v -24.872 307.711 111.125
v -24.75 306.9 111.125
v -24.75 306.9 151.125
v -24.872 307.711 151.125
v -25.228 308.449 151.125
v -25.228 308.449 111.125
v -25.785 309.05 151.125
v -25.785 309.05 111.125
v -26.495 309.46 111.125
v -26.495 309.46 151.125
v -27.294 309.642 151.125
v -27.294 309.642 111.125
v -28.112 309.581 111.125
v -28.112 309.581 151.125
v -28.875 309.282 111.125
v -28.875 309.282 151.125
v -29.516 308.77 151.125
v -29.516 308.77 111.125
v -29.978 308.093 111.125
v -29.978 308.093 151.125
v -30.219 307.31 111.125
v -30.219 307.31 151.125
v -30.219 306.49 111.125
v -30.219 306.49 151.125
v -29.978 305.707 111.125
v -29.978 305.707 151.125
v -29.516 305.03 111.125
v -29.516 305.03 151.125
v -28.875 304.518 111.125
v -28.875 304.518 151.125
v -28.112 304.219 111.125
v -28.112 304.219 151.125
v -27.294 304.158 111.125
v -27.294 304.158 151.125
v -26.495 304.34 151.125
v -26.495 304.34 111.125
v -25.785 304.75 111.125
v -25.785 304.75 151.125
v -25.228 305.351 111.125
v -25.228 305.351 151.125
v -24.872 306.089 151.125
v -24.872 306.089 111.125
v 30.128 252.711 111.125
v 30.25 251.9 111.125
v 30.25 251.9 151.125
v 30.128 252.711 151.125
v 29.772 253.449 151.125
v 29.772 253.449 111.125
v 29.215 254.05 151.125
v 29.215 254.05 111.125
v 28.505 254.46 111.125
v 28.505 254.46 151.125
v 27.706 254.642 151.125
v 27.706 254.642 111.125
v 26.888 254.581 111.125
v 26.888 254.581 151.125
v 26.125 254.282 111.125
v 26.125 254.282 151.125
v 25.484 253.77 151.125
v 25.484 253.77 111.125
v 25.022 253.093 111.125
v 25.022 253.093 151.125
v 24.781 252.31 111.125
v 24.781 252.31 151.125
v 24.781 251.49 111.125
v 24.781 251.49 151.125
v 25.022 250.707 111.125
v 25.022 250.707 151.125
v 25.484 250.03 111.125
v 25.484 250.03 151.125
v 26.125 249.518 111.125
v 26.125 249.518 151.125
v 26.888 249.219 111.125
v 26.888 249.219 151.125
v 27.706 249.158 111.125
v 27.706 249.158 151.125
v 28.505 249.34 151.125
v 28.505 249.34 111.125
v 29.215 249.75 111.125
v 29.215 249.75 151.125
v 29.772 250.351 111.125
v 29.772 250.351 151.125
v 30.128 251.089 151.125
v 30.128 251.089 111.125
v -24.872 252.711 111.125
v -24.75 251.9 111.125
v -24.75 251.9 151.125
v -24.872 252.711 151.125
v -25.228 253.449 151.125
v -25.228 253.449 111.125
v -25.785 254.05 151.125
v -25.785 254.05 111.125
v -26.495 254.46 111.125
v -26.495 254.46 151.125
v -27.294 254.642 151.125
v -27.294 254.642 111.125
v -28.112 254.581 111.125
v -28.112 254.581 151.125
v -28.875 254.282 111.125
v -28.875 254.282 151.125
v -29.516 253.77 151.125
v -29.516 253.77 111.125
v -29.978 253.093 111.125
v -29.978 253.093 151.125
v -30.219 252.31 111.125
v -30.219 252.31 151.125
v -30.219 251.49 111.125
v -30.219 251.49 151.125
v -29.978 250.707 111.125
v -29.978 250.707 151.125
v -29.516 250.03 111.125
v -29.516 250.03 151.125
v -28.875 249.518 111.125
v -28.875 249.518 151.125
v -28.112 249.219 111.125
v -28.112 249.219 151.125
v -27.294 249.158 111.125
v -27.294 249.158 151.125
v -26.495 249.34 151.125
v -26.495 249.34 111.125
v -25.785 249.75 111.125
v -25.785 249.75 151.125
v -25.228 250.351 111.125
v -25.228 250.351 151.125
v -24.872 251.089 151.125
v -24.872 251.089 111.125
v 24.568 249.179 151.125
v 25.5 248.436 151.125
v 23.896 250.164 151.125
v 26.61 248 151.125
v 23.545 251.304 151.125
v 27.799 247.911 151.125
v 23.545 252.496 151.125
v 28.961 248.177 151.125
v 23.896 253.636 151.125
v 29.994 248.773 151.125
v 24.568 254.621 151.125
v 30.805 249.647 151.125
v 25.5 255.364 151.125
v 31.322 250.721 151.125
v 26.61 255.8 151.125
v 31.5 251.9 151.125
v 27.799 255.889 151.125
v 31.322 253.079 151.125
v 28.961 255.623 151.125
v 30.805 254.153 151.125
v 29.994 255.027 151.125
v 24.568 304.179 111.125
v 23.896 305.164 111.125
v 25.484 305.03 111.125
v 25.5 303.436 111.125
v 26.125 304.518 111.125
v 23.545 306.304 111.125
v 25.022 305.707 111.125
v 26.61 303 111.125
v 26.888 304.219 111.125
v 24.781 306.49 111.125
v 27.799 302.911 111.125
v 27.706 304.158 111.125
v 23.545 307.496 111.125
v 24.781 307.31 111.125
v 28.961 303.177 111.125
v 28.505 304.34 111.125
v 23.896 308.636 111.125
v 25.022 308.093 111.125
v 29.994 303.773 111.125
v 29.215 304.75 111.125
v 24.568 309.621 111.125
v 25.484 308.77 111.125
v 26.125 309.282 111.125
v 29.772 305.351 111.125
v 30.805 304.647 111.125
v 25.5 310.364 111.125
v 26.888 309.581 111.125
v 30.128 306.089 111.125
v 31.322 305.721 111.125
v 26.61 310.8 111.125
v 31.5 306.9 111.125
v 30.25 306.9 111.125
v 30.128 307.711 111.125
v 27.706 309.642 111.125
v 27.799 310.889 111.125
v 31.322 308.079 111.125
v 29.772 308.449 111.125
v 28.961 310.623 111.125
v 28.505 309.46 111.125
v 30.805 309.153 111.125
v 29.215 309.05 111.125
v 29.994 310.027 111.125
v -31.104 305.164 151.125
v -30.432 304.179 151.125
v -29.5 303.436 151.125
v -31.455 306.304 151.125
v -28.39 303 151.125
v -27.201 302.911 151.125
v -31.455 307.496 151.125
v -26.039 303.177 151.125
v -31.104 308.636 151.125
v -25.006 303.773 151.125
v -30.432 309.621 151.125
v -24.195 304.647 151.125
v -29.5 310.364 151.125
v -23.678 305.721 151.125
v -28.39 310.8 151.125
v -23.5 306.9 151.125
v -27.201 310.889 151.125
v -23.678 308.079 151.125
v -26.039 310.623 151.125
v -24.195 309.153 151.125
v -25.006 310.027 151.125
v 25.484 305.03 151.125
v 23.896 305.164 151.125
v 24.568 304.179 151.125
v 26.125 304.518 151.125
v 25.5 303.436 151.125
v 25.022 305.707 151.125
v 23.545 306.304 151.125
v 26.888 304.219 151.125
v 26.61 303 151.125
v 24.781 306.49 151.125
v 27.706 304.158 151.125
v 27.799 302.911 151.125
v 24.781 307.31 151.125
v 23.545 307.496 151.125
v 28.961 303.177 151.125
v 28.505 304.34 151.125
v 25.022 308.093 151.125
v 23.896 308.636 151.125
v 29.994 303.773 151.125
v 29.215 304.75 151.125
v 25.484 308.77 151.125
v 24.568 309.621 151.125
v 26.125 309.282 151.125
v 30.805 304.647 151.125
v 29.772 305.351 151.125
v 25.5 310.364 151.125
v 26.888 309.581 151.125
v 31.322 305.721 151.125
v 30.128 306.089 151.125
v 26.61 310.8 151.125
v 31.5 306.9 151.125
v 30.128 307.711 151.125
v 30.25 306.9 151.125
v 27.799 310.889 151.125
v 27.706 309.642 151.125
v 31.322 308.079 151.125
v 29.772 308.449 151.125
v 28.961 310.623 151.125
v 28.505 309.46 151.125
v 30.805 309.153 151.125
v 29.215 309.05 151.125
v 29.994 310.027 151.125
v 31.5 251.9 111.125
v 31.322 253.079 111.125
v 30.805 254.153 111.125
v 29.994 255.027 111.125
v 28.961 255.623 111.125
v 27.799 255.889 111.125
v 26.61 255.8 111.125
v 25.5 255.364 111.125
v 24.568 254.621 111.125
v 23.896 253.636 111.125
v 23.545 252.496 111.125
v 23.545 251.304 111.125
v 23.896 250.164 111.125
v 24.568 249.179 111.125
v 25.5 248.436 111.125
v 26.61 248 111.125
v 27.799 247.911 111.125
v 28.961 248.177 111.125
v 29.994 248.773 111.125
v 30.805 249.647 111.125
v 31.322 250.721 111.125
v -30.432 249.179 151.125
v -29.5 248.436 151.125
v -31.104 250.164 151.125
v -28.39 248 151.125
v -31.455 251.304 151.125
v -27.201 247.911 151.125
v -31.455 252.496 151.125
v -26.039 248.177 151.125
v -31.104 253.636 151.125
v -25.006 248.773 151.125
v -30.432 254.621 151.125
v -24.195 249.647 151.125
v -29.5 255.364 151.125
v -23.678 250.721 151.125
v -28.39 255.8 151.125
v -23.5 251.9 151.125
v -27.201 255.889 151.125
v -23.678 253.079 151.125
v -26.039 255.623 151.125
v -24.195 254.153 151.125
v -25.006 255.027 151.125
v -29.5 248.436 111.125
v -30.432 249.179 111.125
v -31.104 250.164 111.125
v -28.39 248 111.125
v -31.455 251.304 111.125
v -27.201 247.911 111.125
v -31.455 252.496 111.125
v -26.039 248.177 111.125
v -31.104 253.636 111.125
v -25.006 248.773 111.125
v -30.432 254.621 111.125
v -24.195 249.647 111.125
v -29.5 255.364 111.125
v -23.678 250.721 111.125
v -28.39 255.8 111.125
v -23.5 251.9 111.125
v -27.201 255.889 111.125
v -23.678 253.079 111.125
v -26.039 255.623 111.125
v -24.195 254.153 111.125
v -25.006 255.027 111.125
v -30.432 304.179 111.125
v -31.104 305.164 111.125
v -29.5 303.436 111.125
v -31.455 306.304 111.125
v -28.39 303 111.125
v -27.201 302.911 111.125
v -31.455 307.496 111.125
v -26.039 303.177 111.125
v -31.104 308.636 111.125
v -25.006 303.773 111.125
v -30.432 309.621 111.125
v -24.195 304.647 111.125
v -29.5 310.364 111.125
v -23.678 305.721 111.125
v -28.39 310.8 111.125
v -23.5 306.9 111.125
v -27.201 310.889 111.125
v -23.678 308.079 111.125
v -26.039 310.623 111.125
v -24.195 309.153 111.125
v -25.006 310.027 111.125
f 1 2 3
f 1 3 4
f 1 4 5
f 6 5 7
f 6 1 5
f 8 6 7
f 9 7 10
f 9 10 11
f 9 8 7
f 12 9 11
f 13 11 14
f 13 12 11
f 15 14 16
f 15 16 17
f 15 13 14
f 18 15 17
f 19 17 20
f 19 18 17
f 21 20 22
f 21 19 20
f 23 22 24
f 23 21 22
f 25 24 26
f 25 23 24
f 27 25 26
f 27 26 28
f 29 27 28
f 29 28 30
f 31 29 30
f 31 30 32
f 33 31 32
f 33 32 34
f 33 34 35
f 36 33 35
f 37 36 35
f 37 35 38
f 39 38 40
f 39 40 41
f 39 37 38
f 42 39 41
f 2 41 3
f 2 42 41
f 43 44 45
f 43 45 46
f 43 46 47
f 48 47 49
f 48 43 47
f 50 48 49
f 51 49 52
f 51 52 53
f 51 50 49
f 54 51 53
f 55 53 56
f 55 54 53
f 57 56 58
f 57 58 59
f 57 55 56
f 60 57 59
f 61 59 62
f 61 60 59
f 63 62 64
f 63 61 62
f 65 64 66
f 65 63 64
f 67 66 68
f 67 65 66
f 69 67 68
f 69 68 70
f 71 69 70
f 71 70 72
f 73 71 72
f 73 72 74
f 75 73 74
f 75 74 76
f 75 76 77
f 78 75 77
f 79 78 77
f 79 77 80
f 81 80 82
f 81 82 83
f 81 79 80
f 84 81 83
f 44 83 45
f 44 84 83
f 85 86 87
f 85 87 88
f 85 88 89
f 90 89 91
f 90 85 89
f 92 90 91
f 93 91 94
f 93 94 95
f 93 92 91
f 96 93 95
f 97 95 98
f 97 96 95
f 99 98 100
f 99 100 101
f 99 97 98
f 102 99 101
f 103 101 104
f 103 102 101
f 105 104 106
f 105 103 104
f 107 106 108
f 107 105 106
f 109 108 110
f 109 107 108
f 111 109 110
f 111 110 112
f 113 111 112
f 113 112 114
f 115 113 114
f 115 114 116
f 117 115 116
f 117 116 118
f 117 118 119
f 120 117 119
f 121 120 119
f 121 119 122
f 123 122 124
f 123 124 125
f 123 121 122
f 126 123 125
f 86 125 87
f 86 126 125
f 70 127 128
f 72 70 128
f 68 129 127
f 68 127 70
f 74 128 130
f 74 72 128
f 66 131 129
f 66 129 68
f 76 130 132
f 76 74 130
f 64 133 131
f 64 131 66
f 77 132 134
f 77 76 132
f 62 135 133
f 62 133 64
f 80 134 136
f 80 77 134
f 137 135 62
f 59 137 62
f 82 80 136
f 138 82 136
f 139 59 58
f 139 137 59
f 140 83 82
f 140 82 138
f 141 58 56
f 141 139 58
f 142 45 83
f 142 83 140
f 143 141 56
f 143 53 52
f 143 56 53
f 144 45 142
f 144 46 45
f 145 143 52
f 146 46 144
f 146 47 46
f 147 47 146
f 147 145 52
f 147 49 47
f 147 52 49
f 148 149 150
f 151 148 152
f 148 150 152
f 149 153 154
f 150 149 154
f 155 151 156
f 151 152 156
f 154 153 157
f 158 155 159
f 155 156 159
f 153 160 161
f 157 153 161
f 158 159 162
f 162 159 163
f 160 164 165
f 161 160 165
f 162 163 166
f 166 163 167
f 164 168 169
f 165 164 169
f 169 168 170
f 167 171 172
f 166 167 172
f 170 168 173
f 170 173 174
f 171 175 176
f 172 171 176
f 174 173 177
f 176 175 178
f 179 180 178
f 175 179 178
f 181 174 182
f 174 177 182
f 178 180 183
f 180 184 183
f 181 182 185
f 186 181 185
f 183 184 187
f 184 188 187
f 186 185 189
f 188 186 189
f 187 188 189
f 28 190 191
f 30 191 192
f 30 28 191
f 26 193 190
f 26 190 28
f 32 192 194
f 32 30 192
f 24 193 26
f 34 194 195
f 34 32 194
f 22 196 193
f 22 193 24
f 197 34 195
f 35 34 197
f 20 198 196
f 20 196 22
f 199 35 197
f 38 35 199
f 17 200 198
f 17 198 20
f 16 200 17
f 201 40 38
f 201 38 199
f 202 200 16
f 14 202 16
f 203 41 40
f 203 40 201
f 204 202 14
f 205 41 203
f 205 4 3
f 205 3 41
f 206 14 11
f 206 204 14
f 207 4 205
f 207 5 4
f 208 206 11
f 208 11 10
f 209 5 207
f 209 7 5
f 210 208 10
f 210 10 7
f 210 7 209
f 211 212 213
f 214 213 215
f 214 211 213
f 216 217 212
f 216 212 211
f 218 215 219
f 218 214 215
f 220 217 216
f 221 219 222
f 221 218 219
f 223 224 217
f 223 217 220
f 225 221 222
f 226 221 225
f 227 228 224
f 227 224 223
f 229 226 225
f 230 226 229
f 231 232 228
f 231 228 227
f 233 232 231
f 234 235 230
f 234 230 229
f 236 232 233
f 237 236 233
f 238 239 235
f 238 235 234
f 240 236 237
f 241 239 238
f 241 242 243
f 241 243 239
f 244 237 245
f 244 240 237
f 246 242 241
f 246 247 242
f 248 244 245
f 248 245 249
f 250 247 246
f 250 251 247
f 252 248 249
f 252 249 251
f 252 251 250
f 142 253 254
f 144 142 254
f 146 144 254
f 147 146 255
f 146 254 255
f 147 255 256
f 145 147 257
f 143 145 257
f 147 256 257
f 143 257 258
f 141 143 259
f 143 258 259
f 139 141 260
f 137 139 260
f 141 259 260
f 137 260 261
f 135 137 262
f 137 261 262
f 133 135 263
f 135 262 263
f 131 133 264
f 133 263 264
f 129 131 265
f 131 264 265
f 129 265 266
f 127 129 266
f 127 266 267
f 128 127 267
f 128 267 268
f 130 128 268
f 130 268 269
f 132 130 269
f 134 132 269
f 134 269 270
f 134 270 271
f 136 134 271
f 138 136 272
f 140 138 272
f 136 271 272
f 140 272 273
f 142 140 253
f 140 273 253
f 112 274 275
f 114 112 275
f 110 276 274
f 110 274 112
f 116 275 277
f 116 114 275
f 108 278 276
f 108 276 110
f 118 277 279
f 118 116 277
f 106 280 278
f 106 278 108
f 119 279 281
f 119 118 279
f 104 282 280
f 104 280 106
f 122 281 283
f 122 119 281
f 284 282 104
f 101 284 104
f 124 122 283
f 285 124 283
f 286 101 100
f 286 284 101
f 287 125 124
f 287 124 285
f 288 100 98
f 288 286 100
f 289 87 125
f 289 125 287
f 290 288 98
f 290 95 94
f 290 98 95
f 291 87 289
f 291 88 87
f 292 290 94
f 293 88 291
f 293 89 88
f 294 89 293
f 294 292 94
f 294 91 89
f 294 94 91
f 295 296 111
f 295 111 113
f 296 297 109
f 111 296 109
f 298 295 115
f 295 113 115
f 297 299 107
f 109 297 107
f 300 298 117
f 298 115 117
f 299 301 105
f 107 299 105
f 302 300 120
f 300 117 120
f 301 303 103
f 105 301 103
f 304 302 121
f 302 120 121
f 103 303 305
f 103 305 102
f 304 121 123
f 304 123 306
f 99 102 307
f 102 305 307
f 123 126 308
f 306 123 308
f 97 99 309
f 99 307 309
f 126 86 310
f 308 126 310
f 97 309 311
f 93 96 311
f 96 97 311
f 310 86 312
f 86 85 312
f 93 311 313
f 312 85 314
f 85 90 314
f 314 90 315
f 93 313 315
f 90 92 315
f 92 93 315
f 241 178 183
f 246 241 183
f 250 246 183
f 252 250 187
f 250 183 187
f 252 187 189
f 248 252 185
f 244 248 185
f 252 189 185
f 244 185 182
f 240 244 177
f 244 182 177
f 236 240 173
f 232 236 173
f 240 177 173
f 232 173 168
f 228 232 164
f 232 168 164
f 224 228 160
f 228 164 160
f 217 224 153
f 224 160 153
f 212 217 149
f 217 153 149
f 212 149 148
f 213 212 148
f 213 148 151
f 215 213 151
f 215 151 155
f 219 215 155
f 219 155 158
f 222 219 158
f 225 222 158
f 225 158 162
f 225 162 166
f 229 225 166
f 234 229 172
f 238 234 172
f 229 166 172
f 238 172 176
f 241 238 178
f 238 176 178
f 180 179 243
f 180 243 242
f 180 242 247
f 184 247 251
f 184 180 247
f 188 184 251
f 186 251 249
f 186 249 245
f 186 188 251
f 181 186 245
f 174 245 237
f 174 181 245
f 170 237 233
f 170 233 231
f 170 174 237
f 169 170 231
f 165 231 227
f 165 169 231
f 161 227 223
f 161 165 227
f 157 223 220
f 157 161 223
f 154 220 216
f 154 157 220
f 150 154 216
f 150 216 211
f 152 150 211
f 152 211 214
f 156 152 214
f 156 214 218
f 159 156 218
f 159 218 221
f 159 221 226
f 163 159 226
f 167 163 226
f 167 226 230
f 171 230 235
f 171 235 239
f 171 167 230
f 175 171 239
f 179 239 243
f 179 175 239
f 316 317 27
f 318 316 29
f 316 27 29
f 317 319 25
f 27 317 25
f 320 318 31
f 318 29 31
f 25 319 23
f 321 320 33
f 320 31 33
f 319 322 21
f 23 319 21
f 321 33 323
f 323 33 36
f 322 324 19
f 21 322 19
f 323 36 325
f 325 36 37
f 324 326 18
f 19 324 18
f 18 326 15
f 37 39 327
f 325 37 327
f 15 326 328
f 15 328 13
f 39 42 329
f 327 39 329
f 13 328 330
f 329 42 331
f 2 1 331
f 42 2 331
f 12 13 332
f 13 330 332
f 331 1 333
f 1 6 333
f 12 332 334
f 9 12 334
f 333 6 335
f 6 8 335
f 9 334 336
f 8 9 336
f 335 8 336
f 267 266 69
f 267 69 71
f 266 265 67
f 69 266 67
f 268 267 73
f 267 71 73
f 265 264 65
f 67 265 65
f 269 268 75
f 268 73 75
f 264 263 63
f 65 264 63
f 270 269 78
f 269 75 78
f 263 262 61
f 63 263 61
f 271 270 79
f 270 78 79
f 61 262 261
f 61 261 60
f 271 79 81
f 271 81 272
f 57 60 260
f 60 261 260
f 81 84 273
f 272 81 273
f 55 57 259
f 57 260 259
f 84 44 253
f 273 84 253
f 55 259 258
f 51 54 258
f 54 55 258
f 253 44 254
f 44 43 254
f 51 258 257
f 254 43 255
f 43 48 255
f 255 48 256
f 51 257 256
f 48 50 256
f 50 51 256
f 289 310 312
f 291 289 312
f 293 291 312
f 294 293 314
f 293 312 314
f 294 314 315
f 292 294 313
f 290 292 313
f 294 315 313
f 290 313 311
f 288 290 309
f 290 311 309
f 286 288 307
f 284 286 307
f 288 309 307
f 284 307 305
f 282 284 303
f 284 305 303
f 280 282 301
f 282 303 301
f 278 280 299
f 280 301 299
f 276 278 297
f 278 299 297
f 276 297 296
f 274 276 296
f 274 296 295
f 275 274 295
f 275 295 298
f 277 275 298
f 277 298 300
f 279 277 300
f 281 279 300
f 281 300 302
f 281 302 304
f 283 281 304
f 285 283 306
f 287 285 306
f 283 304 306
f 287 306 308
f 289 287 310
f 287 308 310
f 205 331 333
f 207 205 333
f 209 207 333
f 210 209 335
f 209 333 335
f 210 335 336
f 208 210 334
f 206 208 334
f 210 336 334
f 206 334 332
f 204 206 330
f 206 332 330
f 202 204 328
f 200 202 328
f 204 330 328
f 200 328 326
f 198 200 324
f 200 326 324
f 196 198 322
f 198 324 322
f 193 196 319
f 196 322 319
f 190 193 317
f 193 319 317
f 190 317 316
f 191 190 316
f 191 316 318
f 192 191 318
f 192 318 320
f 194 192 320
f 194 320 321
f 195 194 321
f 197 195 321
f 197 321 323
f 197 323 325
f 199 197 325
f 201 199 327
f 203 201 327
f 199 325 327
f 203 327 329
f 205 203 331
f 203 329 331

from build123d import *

# Parameters (mm, degrees)
SKETCH1_R             = 4
SKETCH1_R_2           = 2.75
BOSS_EXTRUDE1_DEPTH   = 40
BOSS_EXTRUDE1_2_DEPTH = 40
BOSS_EXTRUDE1_3_DEPTH = 40
BOSS_EXTRUDE1_4_DEPTH = 40


with BuildPart() as part:
    # Sketch1 → Boss-Extrude1 (new body)
    with BuildSketch(Plane.XY.offset(111.125)):
        with Locations((27.5, 306.9)):
            Circle(SKETCH1_R)
        with Locations((27.5, 306.9)):
            Circle(SKETCH1_R_2, mode=Mode.SUBTRACT)
    extrude(amount=BOSS_EXTRUDE1_DEPTH)


with BuildPart() as body_2:
    # Sketch1 → Boss-Extrude1 2 (new body)
    with BuildSketch(Plane.XY.offset(111.125)):
        with Locations((-27.5, 306.9)):
            Circle(SKETCH1_R)
        with Locations((-27.5, 306.9)):
            Circle(SKETCH1_R_2, mode=Mode.SUBTRACT)
    extrude(amount=BOSS_EXTRUDE1_2_DEPTH)


with BuildPart() as body_3:
    # Sketch1 → Boss-Extrude1 3 (new body)
    with BuildSketch(Plane.XY.offset(111.125)):
        with Locations((-27.5, 251.9)):
            Circle(SKETCH1_R)
        with Locations((-27.5, 251.9)):
            Circle(SKETCH1_R_2, mode=Mode.SUBTRACT)
    extrude(amount=BOSS_EXTRUDE1_3_DEPTH)


with BuildPart() as body_4:
    # Sketch1 → Boss-Extrude1 4 (new body)
    with BuildSketch(Plane.XY.offset(111.125)):
        with Locations((27.5, 251.9)):
            Circle(SKETCH1_R)
        with Locations((27.5, 251.9)):
            Circle(SKETCH1_R_2, mode=Mode.SUBTRACT)
    extrude(amount=BOSS_EXTRUDE1_4_DEPTH)


solid = Compound([part.part, body_2.part, body_3.part, body_4.part])
